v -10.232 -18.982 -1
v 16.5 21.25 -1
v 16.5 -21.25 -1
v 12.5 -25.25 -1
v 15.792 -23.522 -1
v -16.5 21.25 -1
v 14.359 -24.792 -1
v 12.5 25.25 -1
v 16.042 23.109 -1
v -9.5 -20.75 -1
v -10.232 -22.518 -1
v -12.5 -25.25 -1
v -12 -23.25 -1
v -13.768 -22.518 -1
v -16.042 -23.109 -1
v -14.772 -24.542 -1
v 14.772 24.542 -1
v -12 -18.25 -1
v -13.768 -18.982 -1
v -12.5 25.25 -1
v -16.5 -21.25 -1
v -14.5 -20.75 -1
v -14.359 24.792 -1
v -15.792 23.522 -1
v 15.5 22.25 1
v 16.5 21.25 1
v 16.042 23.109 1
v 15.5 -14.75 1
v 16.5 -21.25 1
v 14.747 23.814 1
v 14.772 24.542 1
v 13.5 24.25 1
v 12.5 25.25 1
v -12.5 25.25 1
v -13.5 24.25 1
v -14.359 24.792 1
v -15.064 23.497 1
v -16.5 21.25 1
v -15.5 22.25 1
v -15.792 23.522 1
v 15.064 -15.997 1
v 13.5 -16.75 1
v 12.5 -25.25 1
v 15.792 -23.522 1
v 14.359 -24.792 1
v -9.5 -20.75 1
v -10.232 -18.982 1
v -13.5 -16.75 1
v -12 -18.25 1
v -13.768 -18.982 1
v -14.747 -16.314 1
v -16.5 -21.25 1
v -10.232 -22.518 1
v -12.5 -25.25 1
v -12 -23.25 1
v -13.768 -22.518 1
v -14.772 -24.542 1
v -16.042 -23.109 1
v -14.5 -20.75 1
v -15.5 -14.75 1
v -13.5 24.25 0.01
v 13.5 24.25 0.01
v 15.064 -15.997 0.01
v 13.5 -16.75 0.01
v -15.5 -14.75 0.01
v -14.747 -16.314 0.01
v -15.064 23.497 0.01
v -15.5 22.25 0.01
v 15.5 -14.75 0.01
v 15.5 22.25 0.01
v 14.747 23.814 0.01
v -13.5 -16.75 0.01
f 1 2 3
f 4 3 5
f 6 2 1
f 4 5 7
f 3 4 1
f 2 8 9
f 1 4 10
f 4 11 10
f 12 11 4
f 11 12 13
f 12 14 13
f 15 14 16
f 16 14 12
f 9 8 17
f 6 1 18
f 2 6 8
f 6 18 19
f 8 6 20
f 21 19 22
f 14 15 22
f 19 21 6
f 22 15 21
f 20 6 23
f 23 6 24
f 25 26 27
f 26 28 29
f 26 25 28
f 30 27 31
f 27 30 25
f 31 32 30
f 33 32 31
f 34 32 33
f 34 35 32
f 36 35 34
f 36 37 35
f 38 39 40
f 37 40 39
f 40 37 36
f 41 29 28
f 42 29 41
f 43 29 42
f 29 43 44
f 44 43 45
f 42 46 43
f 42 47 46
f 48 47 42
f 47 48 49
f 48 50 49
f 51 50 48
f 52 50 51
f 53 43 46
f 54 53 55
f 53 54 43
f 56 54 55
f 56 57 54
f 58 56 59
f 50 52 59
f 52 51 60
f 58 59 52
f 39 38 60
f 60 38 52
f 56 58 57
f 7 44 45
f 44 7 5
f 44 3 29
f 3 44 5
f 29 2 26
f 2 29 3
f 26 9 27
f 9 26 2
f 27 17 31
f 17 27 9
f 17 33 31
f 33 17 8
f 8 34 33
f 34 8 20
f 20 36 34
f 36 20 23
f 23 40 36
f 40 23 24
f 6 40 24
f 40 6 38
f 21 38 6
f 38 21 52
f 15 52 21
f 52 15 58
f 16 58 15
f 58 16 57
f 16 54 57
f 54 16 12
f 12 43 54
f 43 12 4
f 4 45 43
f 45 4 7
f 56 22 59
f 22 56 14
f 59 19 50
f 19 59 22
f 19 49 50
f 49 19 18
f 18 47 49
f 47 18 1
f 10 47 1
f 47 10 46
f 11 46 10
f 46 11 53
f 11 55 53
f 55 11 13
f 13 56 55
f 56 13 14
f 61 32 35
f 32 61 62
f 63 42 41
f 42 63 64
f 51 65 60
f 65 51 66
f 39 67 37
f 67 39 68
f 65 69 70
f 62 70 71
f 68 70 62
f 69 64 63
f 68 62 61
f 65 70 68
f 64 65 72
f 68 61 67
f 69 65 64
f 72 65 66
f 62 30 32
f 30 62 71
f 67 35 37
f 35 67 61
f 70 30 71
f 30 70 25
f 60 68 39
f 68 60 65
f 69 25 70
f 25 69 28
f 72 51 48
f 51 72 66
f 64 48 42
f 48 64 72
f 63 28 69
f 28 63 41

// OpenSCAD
// Parametric keychain with recessed pocket accomodating RFID stickers
// distributed by some banks
// Copyright (C) 2016 Miroslav Hradílek

// This program is  free software:  you can redistribute it and/or modify it
// under  the terms  of the  GNU General Public License  as published by the
// Free Software Foundation, version 3 of the License.
//
// This program  is  distributed  in the hope  that it will  be useful,  but
// WITHOUT  ANY WARRANTY;  without  even the implied  warranty of MERCHANTA-
// BILITY  or  FITNESS FOR A PARTICULAR PURPOSE.  See the GNU General Public
// License for more details.
//
// You should have received a copy of the  GNU General Public License  along
// with this program. If not, see <http://www.gnu.org/licenses/>.

k_thick = 2; // Thickness of the keychain
p_depth = 1; // Depth of the pocket
k_radius = 4; // Radius of the keychain corners
p_radius = 2; // Radius of the pocket corners

h_radius = 2.5; // Radius of the hole
k_width = 33; // Keychain width
k_height = 50.5; // Keychain height
p_width = 31; // Pocket width
p_height = 41; // Pocket height

module 2d_pocket(){
    offset(r = p_radius) {
        square([p_width-2*p_radius,p_height-2*p_radius],center = true);
    }
}

module 2d_outer(){
    offset(r = k_radius) {
        square([k_width-2*k_radius,k_height-2*k_radius],center = true);
    }
}

module 2d_body(){
    hole_x_offset = -k_width/2+h_radius+1*k_thick;
    hole_y_offset = -k_height/2+h_radius+1*k_thick;
    difference(){
        2d_outer();
        // Hole
        translate([hole_x_offset,hole_y_offset,0]) circle(r=h_radius);
    }
}

module 3d_pocket(){
    pocket_y_offset = k_height/2 - p_height/2 - (k_width-p_width)/2;
    pocket_z_offset = k_thick/2-p_depth/2+0.01;
    translate([0,pocket_y_offset,pocket_z_offset]) linear_extrude(height = p_depth, center = true) 2d_pocket();
}


module 3d_outer(){
    linear_extrude(height = k_thick, center = true) 2d_body();
}

module 3d_body(){
    difference() {
        3d_outer();
        3d_pocket();        
    }
}

3d_body();
